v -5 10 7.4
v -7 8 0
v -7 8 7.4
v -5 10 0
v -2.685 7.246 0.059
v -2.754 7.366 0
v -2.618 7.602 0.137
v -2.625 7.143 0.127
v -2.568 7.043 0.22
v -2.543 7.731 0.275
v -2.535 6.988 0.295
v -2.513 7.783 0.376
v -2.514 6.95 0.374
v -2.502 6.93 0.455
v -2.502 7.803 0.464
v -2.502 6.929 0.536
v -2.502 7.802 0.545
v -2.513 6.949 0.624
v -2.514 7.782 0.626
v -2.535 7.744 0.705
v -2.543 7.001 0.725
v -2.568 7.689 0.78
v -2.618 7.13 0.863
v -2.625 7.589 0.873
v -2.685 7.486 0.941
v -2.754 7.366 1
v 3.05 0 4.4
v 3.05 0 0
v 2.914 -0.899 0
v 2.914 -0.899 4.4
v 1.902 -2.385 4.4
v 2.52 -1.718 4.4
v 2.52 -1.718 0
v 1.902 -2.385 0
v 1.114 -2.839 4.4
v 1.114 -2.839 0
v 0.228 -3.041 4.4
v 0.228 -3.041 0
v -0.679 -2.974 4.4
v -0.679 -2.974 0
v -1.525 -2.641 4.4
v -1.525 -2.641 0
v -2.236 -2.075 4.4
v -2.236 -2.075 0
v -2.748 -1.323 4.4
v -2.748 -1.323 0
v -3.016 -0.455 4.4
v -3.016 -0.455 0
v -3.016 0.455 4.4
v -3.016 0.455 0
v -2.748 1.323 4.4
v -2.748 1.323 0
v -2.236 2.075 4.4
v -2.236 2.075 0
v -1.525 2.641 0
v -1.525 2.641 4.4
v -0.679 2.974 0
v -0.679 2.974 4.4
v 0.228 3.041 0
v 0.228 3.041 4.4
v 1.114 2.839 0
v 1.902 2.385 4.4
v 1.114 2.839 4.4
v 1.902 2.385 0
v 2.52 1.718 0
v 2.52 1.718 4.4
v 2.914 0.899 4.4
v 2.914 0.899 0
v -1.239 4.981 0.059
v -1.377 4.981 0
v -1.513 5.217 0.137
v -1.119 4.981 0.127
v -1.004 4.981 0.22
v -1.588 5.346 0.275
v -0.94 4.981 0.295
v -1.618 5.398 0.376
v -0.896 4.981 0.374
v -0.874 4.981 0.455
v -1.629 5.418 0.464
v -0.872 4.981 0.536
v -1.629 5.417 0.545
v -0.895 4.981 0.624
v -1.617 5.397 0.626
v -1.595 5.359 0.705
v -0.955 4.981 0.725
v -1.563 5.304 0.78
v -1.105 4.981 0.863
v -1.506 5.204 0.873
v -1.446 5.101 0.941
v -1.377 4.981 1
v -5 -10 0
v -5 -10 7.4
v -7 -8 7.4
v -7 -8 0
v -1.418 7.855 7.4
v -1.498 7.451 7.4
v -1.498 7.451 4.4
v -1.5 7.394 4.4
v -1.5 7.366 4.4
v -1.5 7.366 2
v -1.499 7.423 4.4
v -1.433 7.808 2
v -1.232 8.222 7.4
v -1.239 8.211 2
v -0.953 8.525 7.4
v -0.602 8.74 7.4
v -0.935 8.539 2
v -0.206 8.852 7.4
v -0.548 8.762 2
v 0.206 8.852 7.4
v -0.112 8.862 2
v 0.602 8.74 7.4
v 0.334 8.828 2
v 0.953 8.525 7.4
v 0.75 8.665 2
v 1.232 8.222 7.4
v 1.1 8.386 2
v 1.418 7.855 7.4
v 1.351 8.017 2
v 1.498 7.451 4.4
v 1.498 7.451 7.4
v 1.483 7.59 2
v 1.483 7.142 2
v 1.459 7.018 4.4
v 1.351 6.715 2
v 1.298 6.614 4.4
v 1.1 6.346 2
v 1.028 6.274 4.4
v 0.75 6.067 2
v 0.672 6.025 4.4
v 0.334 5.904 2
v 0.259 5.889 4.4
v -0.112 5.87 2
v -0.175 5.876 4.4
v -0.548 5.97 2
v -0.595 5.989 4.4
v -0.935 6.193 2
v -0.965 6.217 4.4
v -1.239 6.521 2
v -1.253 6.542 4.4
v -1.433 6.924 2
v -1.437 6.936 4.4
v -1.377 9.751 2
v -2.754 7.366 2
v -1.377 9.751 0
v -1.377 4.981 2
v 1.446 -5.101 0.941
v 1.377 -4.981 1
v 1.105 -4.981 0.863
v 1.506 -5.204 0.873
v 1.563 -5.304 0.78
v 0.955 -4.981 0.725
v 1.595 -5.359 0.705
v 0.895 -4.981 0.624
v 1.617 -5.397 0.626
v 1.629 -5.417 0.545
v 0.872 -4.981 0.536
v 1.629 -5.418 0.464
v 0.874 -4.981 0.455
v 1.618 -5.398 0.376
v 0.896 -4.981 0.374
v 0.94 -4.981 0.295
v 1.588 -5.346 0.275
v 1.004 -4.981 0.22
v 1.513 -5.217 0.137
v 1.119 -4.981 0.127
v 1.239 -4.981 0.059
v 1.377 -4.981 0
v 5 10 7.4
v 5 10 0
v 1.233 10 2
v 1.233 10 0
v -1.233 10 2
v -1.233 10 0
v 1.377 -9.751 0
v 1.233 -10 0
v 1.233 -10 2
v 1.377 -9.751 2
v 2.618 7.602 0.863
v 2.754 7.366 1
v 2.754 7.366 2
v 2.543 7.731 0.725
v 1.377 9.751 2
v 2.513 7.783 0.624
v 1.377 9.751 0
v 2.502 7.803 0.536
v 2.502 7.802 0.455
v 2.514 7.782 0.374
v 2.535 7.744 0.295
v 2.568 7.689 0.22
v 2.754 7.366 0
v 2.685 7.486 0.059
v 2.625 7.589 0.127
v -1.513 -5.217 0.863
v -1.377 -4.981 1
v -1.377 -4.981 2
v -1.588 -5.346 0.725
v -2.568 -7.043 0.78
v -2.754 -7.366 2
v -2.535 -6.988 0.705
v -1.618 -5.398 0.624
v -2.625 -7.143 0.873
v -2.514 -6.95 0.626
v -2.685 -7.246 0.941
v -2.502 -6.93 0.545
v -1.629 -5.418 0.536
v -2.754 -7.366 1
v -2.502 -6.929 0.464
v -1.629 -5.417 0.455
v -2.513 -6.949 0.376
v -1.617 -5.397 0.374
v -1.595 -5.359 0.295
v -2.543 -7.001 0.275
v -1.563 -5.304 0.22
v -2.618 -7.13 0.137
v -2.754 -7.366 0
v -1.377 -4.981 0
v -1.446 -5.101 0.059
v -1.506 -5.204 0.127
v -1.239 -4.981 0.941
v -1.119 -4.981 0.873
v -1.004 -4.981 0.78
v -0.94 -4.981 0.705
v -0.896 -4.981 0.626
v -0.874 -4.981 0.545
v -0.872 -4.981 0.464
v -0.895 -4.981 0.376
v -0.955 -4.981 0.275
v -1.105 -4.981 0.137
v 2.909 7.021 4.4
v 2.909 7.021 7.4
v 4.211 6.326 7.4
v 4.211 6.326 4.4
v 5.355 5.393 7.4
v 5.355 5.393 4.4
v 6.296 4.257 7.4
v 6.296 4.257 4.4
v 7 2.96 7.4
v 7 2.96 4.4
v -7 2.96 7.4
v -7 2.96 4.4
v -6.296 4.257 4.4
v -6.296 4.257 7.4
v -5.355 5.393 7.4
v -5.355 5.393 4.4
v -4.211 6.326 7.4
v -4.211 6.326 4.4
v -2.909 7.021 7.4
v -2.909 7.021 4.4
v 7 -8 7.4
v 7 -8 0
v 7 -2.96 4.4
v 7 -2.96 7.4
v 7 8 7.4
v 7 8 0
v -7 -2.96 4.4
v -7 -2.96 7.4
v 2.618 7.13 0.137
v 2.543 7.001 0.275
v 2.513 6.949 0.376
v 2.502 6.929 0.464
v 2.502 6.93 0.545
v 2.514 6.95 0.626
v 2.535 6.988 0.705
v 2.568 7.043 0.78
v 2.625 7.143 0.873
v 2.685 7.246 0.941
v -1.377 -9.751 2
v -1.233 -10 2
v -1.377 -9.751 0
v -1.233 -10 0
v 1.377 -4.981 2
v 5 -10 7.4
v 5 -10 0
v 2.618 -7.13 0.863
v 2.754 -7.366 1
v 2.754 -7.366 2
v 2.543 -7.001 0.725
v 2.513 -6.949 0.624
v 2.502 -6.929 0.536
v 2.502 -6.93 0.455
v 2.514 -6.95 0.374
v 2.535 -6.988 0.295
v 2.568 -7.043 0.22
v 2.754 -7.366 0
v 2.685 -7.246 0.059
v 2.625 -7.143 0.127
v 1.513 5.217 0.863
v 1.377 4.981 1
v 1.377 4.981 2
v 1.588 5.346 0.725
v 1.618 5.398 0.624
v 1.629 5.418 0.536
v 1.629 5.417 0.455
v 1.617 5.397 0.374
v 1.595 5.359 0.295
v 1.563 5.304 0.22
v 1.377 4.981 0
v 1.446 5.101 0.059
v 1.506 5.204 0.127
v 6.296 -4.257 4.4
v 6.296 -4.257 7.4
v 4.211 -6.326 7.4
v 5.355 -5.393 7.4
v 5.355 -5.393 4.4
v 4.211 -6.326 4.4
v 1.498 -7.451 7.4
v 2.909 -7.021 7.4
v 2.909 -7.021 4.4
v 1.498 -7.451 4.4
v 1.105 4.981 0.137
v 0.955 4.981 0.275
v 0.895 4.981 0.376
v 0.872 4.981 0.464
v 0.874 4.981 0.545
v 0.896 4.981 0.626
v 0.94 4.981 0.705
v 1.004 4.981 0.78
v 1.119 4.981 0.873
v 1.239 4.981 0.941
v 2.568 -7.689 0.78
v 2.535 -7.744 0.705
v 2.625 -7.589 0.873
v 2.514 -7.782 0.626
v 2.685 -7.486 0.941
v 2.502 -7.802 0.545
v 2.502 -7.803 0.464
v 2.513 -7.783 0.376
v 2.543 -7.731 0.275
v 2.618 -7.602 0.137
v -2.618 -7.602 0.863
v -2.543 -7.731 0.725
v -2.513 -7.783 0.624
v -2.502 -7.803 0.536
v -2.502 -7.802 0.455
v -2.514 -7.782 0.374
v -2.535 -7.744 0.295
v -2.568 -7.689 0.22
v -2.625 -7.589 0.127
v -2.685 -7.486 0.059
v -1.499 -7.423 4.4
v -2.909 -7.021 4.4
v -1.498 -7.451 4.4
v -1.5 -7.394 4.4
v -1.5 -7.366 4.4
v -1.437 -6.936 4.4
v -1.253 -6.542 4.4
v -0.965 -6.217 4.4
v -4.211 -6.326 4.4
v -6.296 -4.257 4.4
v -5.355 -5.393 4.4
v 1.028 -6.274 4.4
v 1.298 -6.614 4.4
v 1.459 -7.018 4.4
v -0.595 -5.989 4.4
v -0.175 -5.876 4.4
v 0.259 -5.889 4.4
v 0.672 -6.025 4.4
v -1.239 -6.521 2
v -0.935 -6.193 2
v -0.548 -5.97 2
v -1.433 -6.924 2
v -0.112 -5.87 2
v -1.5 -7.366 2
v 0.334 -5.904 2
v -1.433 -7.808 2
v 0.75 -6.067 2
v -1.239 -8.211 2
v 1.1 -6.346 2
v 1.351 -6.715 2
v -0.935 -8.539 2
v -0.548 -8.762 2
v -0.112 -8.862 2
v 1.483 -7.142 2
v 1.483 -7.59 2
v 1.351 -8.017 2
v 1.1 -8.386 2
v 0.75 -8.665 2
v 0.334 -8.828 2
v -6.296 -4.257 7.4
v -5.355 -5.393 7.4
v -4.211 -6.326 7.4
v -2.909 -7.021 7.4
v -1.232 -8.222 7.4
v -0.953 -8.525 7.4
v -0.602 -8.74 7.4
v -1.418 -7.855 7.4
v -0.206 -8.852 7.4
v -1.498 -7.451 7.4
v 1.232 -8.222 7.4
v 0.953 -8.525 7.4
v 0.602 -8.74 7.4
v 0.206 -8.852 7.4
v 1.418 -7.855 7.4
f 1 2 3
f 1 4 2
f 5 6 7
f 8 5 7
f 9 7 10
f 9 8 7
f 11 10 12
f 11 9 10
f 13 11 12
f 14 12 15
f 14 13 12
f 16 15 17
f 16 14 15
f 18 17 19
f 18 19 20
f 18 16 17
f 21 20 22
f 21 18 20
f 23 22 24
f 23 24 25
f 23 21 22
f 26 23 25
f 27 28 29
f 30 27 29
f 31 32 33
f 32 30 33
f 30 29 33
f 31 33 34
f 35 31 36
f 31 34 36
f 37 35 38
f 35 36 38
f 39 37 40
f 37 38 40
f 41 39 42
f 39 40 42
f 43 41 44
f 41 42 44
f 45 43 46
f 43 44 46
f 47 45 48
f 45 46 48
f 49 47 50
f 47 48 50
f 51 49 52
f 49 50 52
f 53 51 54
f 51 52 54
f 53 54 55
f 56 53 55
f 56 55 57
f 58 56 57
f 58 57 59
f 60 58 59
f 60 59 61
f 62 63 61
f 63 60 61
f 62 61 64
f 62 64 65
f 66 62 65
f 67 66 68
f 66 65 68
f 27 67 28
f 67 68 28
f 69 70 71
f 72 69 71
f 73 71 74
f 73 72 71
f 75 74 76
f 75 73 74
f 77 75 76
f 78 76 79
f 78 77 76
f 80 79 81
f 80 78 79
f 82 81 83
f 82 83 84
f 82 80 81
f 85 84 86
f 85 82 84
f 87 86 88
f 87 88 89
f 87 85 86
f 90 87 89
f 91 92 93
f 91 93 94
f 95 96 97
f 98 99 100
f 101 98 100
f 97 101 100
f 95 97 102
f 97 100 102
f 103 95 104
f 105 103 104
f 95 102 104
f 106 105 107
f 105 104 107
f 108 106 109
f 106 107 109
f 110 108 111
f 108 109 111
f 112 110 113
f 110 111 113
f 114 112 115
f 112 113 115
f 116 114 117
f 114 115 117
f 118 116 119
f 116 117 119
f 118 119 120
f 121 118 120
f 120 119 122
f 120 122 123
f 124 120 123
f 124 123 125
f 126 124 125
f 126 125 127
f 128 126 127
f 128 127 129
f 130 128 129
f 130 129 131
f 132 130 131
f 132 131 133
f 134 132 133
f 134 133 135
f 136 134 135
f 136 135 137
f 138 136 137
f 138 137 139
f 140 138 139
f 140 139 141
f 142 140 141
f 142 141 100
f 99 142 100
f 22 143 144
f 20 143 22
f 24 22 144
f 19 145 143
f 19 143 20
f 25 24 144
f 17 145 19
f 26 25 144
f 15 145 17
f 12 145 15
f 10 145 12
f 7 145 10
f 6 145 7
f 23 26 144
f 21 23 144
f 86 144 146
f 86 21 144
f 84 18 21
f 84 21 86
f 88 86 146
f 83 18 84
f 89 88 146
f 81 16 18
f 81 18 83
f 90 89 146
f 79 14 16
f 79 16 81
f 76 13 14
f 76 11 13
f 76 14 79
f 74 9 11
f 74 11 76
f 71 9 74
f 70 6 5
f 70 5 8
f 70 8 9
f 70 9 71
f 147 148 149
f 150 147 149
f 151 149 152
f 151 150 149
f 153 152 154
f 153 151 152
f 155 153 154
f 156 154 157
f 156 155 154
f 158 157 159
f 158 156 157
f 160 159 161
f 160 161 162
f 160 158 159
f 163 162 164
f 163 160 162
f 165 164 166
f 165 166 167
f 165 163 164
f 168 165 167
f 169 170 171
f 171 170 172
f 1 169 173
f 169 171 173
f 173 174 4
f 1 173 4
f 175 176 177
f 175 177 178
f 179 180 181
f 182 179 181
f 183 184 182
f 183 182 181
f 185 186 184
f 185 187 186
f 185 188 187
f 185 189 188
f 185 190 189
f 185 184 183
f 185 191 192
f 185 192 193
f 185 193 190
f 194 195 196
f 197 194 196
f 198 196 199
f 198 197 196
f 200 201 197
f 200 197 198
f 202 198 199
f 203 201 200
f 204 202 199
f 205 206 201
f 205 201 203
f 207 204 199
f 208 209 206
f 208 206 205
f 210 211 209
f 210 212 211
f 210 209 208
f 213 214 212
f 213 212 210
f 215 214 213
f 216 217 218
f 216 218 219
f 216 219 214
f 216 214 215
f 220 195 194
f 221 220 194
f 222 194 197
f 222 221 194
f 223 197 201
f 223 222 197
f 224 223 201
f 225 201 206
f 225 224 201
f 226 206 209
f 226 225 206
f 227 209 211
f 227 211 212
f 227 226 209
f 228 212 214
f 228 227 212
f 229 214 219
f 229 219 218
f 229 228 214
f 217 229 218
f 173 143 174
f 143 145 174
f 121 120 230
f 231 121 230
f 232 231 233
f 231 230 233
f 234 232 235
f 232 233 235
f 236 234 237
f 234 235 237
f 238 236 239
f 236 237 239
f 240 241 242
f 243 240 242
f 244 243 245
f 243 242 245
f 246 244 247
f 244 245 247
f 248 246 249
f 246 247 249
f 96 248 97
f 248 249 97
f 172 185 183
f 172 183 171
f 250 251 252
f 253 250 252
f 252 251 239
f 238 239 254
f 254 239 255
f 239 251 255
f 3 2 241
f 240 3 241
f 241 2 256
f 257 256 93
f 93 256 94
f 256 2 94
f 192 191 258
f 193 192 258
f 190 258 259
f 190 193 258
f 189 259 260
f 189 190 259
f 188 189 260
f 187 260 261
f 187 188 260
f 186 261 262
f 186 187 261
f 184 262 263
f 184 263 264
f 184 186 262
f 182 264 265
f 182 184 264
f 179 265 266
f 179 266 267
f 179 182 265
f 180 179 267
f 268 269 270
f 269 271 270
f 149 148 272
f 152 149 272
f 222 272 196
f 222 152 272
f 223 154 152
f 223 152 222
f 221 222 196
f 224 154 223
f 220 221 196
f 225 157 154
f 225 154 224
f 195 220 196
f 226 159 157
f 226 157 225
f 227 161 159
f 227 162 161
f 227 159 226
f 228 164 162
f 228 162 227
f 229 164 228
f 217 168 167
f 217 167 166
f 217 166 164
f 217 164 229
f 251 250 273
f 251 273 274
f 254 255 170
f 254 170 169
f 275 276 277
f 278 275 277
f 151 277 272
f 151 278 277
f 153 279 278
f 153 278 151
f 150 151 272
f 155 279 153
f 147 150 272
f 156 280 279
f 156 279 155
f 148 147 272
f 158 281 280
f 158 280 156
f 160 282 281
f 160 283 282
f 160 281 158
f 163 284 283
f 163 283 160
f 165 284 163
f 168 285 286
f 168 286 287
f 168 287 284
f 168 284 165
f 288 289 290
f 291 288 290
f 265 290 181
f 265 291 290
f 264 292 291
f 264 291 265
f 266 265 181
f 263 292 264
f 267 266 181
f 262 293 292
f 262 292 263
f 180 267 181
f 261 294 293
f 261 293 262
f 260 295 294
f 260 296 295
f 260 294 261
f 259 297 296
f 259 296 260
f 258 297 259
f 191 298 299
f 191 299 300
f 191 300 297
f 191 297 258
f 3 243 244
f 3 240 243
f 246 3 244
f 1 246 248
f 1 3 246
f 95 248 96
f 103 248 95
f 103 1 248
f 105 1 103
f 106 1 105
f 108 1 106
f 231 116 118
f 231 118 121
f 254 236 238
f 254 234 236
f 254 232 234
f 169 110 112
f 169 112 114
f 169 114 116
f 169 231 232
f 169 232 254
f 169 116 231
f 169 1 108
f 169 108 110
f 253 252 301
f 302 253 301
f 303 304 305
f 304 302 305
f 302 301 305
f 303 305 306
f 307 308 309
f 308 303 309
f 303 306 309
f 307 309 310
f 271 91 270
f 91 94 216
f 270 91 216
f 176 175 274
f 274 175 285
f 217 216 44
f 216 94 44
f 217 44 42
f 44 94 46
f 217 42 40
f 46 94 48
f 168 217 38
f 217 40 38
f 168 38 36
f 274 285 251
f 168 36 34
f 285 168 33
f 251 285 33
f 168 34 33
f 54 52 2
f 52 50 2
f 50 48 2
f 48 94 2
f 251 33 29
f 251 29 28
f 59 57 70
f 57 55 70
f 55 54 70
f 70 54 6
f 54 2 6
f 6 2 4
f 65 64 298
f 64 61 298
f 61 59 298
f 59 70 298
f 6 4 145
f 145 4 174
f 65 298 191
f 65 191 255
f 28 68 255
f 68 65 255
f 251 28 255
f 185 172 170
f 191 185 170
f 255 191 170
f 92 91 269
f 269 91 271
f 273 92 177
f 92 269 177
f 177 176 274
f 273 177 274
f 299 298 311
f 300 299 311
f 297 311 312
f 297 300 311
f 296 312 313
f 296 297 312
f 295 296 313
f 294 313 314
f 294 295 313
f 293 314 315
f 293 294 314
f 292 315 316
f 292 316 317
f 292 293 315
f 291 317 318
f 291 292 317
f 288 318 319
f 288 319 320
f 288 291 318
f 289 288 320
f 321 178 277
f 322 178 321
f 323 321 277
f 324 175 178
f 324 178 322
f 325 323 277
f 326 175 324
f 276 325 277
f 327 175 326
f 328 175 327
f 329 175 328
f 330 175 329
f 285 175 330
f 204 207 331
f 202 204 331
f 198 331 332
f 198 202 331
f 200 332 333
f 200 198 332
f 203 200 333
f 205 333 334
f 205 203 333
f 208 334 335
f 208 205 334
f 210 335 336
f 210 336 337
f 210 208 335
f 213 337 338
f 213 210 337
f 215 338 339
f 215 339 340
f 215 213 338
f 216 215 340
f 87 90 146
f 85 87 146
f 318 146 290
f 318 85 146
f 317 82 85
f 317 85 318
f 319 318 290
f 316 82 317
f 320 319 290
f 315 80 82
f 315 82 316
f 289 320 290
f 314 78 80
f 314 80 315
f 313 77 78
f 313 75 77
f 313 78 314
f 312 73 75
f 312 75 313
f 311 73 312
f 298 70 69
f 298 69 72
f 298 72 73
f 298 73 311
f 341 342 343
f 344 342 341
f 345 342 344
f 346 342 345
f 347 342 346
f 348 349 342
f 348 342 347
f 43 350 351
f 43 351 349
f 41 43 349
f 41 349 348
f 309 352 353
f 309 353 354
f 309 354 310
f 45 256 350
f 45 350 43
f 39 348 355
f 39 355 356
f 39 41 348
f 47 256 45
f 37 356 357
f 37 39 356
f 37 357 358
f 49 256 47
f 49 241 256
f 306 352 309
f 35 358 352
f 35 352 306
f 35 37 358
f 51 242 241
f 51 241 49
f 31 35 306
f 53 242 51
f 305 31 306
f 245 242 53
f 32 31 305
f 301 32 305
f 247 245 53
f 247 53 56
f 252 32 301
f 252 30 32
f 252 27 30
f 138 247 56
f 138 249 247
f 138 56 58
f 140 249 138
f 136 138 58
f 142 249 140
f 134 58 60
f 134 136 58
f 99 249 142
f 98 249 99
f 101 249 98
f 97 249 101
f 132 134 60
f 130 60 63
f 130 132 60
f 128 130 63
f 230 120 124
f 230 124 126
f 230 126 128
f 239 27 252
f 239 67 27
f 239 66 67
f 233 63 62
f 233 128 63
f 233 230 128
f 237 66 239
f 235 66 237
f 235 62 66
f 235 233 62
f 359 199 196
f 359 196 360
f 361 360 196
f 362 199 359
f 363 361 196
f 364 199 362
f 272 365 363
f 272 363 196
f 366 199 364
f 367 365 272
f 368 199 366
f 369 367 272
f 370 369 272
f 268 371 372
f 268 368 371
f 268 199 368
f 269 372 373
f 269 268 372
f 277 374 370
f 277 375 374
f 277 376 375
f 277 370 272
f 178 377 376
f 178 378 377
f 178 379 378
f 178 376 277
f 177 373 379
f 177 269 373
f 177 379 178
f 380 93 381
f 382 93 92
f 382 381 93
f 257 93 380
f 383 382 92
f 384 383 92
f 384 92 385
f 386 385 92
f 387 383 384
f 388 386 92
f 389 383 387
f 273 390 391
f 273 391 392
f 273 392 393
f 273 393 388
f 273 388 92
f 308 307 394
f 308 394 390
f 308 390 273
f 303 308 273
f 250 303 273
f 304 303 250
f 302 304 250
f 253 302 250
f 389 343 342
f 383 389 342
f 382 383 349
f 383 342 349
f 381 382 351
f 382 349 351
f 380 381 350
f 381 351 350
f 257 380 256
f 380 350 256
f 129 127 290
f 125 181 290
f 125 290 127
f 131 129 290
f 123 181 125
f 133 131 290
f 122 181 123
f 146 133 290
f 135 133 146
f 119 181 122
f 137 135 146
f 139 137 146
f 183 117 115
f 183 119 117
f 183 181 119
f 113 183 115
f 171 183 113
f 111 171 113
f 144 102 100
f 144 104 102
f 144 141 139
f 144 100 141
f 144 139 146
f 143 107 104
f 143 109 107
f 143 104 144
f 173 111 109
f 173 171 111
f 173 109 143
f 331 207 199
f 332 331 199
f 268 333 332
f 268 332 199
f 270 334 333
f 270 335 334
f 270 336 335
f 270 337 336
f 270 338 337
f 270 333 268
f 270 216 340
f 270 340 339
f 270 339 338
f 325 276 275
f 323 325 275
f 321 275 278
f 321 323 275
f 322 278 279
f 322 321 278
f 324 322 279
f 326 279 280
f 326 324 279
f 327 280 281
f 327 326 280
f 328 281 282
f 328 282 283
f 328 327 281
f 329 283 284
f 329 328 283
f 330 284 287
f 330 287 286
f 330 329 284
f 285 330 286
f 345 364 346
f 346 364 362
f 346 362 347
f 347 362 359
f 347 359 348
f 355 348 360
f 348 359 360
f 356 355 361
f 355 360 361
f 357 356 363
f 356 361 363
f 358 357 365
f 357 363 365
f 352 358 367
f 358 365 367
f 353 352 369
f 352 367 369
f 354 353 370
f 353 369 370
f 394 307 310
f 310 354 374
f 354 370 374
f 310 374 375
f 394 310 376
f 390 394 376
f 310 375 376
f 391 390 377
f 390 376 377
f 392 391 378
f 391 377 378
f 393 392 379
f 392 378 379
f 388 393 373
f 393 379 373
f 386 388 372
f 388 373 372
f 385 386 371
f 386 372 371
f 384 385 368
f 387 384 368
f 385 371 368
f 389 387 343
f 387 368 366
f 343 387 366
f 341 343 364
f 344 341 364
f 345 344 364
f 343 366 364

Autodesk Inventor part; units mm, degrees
ref_plane "YZ Plane" through (0, 0, 0) normal (1, 0, 0) x (0, 1, 0)
ref_plane "XZ Plane" through (0, 0, 0) normal (0, 1, 0) x (-1, 0, 0)
ref_plane "XY Plane" through (0, 0, 0) normal (0, 0, 1) x (1, 0, 0)
sketch "Sketch1" plane through (0, 0, 0) normal (0, 0, 1) x (1, 0, 0)
  line L0 (7, 10) -> (-7, 10)
  line L1 (-7, 10) -> (-7, -10)
  line L2 (-7, -10) -> (7, -10)
  line L3 (7, -10) -> (7, 10)
  circle A0 centre (0, 0) radius 3.05
  point P0 (0, -10)
  point P1 (7, 0)
  dimension "d0" = 20
  dimension "d1" = 14
  dimension "d2" = 6.1
extrude "Extrusion1" add sketch "Sketch1" along normal blind 4.4
sketch "Sketch2" plane through (0, 0, 4.4) normal (0, 0, 1) x (1, 0, 0)
  circle A0 centre (0, 0) radius 3 construction
  circle A1 centre (0, 0) radius 7.5 construction
  circle A2 centre (0, 0) radius 3.05 construction
  line L0 (7, 10) -> (-7, 10) projected
  line L1 (-7, 10) -> (-7, -10) projected
  line L2 (-7, -10) -> (7, -10) projected
  line L3 (7, -10) -> (7, 10) projected
  circle A3 centre (0, 0) radius 7.6
  line L4 (7, -10) -> (7, 10) projected
  line L5 (7, 2.9597) -> (7, 10)
  line L6 (7, 10) -> (-7, 10) projected
  line L7 (7, 10) -> (-7, 10)
  line L8 (-7, 10) -> (-7, 2.9597)
  line L9 (-7, 10) -> (-7, -10) projected
  line L10 (-7, -2.9597) -> (-7, -10)
  line L11 (-7, -10) -> (7, -10)
  line L12 (7, -2.9597) -> (7, -10)
  dimension "d5" = 15.2
extrude "Extrusion2" add sketch "Sketch2" along normal blind 3 contours L3 A3 L1 L0 | L3 L2 L1 A3
sketch "Sketch4" plane through (0, 0, 0) normal (0, 0, -1) x (-1, 0, 0)
  circle A0 centre (0, 7.366) radius 1.15 projected
  circle A1 centre (0, -7.366) radius 1.15 projected
  circle A2 centre (0, 7.366) radius 1.5
  circle A3 centre (0, -7.366) radius 1.5
  point P0 (0, 0)
  dimension "d11" = 3
extrude "Extrusion4" cut sketch "Sketch4" against normal through all contours A0 | A1 | A2 | A3
sketch "Sketch3" plane through (0, 0, 0) normal (0, 0, -1) x (-1, 0, 0)
  circle A0 centre (0, 7.366) radius 1.15 construction
  circle A1 centre (0, -7.366) radius 1.15 construction
  line L0 (2.754, 7.366) -> (1.377, 4.981)
  line L1 (1.377, 4.981) -> (-1.377, 4.981)
  line L2 (-1.377, 4.981) -> (-2.754, 7.366)
  line L3 (-2.754, 7.366) -> (-1.377, 9.751)
  line L4 (-1.377, 9.751) -> (1.377, 9.751)
  line L5 (1.377, 9.751) -> (2.754, 7.366)
  line L6 (1.377, 9.751) -> (1.2332, 10)
  line L7 (-1.377, 9.751) -> (-1.2332, 10)
  line L8 (1.2332, 10) -> (-1.2332, 10)
  line L9 (-7, 10) -> (7, 10) projected
  point P0 (0, 0)
  dimension "d8" = 4.77
extrude "Extrusion3" cut sketch "Sketch3" against normal blind 2
sketch "Sketch5" plane through (-1.377, 4.981, 0) normal (0, 1, 0) x (1, 0, 0)
  line L0 (-1.377, 0) -> (-1.377, -2) construction
  line L1 (-1.377, 0) -> (-1.377, -1)
  arc A0 (-1.377, -1) -> (-1.377, 0) centre (-1.7436, -0.5) ccw
  point P0 (1.377, 0)
  point P1 (-1.377, -0.5)
  dimension "d15" = 0.62
  dimension "d16" = 0.3666
extrude "Extrusion5" add sketch "Sketch5" along normal blind 3
pattern_circular "Circular Pattern1" count 4 over 180 about axis through (0, 7.366, 0) along (0, 0, 1) of "Extrusion5"
mirror "Mirror1" about plane through (0, 0, 0) normal (0, 1, 0) of "Extrusion3", "Extrusion5", "Circular Pattern1"
chamfer "Chamfer1" distance 2 angle 45 4 edges at (-7, -10, 3.7) (-7, 10, 3.7) (7, 10, 3.7) (7, -10, 3.7)
properties part number "Arm1_BallCasterMount"
